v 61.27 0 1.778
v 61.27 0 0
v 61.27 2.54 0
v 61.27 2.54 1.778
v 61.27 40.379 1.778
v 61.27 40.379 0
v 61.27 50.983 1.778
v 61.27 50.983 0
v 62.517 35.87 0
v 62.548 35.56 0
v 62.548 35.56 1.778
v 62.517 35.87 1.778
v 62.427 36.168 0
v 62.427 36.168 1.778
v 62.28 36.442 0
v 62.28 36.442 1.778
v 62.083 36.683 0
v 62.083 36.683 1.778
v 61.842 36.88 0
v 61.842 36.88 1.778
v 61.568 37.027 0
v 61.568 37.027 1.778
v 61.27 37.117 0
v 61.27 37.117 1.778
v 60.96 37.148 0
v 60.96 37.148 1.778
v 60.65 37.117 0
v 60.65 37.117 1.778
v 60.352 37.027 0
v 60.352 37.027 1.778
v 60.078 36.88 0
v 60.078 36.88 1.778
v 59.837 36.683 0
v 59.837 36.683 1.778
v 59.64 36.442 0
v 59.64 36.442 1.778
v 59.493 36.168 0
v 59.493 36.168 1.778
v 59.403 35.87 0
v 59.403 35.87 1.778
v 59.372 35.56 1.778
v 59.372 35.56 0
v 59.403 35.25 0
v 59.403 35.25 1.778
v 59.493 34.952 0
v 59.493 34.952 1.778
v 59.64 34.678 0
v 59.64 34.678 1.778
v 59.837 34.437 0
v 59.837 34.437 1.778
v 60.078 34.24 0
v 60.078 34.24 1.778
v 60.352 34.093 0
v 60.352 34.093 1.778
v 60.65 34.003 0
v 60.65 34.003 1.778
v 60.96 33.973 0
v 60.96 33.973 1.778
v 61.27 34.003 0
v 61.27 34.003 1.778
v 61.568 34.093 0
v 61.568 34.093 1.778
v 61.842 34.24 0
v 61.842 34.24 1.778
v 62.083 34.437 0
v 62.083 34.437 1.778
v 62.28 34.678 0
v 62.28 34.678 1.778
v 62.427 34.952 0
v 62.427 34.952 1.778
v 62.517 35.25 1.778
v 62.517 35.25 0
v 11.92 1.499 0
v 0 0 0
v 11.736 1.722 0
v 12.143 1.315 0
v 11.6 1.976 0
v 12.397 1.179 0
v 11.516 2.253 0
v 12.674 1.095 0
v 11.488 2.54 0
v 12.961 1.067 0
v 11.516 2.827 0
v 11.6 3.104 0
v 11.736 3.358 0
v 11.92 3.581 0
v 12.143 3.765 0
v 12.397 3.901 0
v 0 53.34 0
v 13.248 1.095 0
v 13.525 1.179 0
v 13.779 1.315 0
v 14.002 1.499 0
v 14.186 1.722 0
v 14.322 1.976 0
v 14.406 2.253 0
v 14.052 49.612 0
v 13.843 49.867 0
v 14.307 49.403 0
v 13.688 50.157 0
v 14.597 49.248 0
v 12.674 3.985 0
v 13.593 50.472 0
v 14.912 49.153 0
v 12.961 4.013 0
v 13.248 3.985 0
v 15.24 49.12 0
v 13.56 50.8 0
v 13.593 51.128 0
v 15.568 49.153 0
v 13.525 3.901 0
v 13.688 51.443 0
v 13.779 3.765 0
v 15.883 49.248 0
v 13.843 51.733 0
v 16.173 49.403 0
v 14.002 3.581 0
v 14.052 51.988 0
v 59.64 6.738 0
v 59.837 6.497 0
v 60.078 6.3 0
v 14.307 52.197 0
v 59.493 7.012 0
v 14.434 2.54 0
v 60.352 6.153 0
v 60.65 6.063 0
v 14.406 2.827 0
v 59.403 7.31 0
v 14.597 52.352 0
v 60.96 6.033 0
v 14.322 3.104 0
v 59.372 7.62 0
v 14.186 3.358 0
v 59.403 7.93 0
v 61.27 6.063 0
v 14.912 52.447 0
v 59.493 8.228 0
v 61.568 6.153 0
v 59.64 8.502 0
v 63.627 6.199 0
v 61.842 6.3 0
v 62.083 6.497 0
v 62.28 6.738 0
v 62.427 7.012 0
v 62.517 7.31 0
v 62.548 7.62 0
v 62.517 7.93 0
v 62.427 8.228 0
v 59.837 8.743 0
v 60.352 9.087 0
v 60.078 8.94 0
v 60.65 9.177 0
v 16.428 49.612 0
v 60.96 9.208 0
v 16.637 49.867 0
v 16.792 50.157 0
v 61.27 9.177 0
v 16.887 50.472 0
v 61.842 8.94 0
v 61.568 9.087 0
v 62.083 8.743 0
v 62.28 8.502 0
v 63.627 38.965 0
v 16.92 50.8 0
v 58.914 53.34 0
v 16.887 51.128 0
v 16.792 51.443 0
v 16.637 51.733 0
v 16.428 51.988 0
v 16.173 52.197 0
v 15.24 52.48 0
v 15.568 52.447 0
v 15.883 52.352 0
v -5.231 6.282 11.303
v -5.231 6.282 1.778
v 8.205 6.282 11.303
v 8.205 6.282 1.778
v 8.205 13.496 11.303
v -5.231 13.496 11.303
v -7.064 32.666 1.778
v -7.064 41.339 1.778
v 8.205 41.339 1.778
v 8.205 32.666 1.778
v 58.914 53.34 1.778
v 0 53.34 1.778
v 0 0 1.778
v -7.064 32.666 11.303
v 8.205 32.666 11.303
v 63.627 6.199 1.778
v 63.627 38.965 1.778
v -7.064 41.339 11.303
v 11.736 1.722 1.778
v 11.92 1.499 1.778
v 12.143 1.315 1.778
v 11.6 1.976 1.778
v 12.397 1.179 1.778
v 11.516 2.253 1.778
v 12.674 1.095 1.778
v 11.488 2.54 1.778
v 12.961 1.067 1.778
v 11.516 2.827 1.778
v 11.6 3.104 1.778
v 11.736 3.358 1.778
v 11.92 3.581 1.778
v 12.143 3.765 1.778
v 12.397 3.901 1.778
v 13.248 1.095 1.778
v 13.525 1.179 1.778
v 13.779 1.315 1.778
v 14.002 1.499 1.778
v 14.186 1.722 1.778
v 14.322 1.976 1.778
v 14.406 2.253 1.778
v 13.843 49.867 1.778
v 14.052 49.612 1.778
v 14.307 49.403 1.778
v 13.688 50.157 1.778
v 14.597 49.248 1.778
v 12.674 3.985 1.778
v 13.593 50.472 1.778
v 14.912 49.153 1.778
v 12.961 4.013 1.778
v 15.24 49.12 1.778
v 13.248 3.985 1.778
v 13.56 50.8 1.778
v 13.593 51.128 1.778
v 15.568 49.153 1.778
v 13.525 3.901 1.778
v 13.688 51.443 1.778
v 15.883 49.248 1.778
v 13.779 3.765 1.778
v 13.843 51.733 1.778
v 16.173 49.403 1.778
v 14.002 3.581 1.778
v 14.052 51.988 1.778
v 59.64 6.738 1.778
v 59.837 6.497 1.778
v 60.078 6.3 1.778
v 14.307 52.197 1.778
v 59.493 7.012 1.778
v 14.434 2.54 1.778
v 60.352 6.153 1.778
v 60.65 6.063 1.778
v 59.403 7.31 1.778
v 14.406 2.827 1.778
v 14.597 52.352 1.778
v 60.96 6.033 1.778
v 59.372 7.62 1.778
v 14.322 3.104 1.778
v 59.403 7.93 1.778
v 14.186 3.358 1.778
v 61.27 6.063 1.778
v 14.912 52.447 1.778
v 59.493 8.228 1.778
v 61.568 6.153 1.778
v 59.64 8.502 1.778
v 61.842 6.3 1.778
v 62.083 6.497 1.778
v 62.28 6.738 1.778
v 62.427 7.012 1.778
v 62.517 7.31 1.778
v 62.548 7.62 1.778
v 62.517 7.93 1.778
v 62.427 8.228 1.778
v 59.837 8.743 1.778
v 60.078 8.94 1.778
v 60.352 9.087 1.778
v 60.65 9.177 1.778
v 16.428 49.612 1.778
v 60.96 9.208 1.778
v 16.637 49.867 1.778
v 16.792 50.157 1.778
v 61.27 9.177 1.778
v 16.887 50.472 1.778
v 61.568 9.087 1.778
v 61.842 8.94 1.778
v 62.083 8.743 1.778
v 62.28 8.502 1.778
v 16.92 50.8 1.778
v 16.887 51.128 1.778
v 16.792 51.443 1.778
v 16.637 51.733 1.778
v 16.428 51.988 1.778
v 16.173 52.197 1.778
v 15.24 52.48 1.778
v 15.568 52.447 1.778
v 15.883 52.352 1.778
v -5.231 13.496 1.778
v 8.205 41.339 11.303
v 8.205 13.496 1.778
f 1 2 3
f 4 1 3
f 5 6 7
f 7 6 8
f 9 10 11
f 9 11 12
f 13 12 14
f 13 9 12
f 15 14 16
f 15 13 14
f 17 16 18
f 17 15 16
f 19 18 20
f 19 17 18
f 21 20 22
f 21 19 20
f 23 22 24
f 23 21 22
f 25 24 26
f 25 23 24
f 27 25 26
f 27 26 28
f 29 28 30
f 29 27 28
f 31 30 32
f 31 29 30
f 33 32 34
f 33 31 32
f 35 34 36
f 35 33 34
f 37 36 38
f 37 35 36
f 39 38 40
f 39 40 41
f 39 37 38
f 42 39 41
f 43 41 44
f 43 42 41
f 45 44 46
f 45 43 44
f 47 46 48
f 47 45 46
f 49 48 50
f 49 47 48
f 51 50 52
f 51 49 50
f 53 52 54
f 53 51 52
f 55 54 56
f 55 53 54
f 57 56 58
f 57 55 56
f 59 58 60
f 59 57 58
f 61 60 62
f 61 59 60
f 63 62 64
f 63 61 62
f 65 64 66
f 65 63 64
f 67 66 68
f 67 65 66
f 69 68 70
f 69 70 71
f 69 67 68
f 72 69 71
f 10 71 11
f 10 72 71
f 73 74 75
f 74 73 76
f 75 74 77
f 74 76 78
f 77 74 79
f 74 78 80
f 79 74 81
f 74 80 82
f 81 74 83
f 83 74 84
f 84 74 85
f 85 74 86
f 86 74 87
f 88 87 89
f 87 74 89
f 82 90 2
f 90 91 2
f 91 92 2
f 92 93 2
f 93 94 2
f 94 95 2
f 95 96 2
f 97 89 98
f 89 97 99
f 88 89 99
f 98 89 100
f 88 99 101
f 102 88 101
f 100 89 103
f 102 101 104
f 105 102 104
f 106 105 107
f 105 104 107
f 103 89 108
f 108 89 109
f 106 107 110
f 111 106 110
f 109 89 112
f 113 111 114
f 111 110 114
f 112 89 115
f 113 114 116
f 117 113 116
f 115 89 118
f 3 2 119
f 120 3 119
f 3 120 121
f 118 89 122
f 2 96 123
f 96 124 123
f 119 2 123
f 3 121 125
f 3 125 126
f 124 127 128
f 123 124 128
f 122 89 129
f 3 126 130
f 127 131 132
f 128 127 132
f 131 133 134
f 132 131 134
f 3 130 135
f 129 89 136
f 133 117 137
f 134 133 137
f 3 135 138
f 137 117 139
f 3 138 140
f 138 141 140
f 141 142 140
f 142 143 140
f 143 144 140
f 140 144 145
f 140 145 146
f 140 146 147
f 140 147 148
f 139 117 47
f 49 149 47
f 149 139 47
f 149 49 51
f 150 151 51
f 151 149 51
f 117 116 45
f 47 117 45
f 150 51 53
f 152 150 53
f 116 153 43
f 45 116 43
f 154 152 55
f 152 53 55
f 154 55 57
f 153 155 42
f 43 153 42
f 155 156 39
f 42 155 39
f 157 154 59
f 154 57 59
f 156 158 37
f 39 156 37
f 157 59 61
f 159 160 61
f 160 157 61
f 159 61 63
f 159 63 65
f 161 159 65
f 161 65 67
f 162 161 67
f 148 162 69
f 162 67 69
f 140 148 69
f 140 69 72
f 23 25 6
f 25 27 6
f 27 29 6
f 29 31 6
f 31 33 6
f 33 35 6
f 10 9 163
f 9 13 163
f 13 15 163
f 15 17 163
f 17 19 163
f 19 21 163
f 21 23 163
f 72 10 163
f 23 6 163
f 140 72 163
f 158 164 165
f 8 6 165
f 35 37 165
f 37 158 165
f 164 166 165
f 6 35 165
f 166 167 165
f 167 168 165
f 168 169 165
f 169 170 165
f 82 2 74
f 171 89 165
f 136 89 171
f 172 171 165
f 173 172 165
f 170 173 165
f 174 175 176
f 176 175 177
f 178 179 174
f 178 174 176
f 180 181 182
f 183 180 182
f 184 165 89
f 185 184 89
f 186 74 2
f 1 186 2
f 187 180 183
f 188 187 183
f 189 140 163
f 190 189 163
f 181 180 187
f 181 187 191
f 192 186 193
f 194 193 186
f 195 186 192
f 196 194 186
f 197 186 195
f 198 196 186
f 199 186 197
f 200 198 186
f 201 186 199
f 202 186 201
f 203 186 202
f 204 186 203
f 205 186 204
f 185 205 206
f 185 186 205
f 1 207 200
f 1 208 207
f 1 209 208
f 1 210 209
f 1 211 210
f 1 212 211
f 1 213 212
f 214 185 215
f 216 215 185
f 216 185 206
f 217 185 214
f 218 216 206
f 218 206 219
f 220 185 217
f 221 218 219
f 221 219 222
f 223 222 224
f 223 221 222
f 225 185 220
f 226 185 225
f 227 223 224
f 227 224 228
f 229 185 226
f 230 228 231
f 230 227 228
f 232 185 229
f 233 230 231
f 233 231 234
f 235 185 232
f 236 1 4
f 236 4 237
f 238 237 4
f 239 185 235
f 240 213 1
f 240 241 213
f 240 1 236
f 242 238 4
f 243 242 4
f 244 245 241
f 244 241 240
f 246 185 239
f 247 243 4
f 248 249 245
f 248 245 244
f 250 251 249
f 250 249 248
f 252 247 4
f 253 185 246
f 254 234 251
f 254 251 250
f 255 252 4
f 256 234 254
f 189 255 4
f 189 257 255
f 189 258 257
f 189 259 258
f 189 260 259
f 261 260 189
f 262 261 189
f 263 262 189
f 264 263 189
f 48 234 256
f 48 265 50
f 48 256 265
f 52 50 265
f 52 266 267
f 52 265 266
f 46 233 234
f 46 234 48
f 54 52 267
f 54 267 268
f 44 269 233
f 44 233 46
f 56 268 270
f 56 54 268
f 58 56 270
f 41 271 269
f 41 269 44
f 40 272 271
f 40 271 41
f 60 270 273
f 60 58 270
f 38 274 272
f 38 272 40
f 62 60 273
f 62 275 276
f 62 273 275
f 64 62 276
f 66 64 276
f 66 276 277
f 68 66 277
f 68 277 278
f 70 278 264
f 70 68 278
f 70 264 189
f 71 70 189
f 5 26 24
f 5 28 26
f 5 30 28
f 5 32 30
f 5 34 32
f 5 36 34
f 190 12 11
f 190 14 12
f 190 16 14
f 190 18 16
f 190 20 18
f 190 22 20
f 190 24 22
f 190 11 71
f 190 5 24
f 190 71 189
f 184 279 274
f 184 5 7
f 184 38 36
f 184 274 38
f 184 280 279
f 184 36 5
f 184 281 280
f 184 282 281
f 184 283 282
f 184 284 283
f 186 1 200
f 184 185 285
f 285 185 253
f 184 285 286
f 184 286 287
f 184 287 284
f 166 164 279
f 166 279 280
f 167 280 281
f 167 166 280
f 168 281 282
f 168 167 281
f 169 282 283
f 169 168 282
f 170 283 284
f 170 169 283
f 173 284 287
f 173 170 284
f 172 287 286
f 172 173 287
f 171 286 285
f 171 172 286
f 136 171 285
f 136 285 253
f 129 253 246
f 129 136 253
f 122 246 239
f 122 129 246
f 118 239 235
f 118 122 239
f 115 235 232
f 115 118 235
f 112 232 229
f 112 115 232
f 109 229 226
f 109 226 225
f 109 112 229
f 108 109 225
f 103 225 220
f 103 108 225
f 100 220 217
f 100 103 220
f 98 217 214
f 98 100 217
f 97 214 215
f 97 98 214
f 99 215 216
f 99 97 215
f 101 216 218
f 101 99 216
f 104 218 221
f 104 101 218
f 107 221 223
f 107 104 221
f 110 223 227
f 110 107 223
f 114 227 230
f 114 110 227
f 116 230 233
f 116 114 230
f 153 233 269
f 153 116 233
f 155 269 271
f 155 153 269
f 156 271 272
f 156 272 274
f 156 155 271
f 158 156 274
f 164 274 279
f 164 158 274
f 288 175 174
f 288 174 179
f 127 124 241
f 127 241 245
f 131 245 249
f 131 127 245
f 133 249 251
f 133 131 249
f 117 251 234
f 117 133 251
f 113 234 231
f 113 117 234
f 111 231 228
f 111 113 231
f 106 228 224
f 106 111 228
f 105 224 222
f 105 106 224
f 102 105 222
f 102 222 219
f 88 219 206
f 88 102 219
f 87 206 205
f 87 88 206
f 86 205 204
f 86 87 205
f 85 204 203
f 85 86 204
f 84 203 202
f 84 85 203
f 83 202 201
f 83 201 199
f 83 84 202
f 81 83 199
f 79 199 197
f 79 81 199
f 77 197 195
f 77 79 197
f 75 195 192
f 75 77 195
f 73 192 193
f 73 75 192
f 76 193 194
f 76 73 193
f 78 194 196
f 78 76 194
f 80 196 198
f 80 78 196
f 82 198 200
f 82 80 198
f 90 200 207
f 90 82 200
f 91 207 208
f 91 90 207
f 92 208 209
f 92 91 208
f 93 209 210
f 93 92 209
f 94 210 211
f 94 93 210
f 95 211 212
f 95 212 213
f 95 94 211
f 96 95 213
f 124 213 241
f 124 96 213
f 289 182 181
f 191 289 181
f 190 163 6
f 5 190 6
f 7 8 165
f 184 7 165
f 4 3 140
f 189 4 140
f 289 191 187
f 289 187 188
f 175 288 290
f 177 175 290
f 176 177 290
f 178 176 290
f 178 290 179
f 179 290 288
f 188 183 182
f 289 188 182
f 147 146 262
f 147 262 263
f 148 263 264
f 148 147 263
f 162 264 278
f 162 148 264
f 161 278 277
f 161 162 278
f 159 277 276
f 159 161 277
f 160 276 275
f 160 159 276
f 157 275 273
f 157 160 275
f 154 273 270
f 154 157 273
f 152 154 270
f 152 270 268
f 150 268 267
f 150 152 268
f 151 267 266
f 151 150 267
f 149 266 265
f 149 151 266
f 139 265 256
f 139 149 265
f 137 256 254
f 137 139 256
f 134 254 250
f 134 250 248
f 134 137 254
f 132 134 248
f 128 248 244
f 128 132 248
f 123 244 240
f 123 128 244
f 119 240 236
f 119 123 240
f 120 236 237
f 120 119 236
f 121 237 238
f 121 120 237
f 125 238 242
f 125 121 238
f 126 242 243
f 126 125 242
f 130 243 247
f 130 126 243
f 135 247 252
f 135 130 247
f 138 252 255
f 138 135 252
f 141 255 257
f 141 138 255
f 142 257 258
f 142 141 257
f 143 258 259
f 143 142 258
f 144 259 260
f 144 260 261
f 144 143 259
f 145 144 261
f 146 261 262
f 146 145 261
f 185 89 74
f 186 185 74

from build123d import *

# Parameters (mm, degrees)
F0_R     = 1.472841
F0_R_2   = 1.5875
F0_R_3   = 1.679588
F1_DEPTH = 1.778
F2_W     = 7.063547
F2_H     = 8.672543
F2_W_2   = 5.23132
F2_H_2   = 7.2136
F2_W_3   = 8.205013
F2_W_4   = 8.20528
F3_DEPTH = 9.525


with BuildPart() as f1:
    # F0 (on Top) → F1 (new body)
    with BuildSketch(Plane.XY):
        Polygon((0, 53.34), (0, 0), (61.270186, 0), (61.270186, 2.54), (63.626732, 6.199072), (63.626732, 38.965072), (61.270186, 40.378999), (61.270186, 50.983454), (58.91364, 53.34), align=None)
        with Locations((12.961001, 2.54)):
            Circle(F0_R, mode=Mode.SUBTRACT)
        with Locations((60.96, 7.62)):
            Circle(F0_R_2, mode=Mode.SUBTRACT)
        with Locations((15.24, 50.8)):
            Circle(F0_R_3, mode=Mode.SUBTRACT)
        with Locations((60.96, 35.56)):
            Circle(F0_R_2, mode=Mode.SUBTRACT)
    extrude(amount=F1_DEPTH)


with BuildPart() as f3:
    # F2 (on face) → F3 (new body)
    with BuildSketch(Plane.XY.offset(1.778)):
        with Locations((-3.531773, 37.0026)):
            Rectangle(F2_W, F2_H)
        with Locations((-2.61566, 9.889059)):
            Rectangle(F2_W_2, F2_H_2)
        with Locations((4.102506, 37.0026)):
            Rectangle(F2_W_3, F2_H)
        with Locations((4.10264, 9.889059)):
            Rectangle(F2_W_4, F2_H_2)
    extrude(amount=F3_DEPTH)


solid = Compound([f1.part, f3.part])
